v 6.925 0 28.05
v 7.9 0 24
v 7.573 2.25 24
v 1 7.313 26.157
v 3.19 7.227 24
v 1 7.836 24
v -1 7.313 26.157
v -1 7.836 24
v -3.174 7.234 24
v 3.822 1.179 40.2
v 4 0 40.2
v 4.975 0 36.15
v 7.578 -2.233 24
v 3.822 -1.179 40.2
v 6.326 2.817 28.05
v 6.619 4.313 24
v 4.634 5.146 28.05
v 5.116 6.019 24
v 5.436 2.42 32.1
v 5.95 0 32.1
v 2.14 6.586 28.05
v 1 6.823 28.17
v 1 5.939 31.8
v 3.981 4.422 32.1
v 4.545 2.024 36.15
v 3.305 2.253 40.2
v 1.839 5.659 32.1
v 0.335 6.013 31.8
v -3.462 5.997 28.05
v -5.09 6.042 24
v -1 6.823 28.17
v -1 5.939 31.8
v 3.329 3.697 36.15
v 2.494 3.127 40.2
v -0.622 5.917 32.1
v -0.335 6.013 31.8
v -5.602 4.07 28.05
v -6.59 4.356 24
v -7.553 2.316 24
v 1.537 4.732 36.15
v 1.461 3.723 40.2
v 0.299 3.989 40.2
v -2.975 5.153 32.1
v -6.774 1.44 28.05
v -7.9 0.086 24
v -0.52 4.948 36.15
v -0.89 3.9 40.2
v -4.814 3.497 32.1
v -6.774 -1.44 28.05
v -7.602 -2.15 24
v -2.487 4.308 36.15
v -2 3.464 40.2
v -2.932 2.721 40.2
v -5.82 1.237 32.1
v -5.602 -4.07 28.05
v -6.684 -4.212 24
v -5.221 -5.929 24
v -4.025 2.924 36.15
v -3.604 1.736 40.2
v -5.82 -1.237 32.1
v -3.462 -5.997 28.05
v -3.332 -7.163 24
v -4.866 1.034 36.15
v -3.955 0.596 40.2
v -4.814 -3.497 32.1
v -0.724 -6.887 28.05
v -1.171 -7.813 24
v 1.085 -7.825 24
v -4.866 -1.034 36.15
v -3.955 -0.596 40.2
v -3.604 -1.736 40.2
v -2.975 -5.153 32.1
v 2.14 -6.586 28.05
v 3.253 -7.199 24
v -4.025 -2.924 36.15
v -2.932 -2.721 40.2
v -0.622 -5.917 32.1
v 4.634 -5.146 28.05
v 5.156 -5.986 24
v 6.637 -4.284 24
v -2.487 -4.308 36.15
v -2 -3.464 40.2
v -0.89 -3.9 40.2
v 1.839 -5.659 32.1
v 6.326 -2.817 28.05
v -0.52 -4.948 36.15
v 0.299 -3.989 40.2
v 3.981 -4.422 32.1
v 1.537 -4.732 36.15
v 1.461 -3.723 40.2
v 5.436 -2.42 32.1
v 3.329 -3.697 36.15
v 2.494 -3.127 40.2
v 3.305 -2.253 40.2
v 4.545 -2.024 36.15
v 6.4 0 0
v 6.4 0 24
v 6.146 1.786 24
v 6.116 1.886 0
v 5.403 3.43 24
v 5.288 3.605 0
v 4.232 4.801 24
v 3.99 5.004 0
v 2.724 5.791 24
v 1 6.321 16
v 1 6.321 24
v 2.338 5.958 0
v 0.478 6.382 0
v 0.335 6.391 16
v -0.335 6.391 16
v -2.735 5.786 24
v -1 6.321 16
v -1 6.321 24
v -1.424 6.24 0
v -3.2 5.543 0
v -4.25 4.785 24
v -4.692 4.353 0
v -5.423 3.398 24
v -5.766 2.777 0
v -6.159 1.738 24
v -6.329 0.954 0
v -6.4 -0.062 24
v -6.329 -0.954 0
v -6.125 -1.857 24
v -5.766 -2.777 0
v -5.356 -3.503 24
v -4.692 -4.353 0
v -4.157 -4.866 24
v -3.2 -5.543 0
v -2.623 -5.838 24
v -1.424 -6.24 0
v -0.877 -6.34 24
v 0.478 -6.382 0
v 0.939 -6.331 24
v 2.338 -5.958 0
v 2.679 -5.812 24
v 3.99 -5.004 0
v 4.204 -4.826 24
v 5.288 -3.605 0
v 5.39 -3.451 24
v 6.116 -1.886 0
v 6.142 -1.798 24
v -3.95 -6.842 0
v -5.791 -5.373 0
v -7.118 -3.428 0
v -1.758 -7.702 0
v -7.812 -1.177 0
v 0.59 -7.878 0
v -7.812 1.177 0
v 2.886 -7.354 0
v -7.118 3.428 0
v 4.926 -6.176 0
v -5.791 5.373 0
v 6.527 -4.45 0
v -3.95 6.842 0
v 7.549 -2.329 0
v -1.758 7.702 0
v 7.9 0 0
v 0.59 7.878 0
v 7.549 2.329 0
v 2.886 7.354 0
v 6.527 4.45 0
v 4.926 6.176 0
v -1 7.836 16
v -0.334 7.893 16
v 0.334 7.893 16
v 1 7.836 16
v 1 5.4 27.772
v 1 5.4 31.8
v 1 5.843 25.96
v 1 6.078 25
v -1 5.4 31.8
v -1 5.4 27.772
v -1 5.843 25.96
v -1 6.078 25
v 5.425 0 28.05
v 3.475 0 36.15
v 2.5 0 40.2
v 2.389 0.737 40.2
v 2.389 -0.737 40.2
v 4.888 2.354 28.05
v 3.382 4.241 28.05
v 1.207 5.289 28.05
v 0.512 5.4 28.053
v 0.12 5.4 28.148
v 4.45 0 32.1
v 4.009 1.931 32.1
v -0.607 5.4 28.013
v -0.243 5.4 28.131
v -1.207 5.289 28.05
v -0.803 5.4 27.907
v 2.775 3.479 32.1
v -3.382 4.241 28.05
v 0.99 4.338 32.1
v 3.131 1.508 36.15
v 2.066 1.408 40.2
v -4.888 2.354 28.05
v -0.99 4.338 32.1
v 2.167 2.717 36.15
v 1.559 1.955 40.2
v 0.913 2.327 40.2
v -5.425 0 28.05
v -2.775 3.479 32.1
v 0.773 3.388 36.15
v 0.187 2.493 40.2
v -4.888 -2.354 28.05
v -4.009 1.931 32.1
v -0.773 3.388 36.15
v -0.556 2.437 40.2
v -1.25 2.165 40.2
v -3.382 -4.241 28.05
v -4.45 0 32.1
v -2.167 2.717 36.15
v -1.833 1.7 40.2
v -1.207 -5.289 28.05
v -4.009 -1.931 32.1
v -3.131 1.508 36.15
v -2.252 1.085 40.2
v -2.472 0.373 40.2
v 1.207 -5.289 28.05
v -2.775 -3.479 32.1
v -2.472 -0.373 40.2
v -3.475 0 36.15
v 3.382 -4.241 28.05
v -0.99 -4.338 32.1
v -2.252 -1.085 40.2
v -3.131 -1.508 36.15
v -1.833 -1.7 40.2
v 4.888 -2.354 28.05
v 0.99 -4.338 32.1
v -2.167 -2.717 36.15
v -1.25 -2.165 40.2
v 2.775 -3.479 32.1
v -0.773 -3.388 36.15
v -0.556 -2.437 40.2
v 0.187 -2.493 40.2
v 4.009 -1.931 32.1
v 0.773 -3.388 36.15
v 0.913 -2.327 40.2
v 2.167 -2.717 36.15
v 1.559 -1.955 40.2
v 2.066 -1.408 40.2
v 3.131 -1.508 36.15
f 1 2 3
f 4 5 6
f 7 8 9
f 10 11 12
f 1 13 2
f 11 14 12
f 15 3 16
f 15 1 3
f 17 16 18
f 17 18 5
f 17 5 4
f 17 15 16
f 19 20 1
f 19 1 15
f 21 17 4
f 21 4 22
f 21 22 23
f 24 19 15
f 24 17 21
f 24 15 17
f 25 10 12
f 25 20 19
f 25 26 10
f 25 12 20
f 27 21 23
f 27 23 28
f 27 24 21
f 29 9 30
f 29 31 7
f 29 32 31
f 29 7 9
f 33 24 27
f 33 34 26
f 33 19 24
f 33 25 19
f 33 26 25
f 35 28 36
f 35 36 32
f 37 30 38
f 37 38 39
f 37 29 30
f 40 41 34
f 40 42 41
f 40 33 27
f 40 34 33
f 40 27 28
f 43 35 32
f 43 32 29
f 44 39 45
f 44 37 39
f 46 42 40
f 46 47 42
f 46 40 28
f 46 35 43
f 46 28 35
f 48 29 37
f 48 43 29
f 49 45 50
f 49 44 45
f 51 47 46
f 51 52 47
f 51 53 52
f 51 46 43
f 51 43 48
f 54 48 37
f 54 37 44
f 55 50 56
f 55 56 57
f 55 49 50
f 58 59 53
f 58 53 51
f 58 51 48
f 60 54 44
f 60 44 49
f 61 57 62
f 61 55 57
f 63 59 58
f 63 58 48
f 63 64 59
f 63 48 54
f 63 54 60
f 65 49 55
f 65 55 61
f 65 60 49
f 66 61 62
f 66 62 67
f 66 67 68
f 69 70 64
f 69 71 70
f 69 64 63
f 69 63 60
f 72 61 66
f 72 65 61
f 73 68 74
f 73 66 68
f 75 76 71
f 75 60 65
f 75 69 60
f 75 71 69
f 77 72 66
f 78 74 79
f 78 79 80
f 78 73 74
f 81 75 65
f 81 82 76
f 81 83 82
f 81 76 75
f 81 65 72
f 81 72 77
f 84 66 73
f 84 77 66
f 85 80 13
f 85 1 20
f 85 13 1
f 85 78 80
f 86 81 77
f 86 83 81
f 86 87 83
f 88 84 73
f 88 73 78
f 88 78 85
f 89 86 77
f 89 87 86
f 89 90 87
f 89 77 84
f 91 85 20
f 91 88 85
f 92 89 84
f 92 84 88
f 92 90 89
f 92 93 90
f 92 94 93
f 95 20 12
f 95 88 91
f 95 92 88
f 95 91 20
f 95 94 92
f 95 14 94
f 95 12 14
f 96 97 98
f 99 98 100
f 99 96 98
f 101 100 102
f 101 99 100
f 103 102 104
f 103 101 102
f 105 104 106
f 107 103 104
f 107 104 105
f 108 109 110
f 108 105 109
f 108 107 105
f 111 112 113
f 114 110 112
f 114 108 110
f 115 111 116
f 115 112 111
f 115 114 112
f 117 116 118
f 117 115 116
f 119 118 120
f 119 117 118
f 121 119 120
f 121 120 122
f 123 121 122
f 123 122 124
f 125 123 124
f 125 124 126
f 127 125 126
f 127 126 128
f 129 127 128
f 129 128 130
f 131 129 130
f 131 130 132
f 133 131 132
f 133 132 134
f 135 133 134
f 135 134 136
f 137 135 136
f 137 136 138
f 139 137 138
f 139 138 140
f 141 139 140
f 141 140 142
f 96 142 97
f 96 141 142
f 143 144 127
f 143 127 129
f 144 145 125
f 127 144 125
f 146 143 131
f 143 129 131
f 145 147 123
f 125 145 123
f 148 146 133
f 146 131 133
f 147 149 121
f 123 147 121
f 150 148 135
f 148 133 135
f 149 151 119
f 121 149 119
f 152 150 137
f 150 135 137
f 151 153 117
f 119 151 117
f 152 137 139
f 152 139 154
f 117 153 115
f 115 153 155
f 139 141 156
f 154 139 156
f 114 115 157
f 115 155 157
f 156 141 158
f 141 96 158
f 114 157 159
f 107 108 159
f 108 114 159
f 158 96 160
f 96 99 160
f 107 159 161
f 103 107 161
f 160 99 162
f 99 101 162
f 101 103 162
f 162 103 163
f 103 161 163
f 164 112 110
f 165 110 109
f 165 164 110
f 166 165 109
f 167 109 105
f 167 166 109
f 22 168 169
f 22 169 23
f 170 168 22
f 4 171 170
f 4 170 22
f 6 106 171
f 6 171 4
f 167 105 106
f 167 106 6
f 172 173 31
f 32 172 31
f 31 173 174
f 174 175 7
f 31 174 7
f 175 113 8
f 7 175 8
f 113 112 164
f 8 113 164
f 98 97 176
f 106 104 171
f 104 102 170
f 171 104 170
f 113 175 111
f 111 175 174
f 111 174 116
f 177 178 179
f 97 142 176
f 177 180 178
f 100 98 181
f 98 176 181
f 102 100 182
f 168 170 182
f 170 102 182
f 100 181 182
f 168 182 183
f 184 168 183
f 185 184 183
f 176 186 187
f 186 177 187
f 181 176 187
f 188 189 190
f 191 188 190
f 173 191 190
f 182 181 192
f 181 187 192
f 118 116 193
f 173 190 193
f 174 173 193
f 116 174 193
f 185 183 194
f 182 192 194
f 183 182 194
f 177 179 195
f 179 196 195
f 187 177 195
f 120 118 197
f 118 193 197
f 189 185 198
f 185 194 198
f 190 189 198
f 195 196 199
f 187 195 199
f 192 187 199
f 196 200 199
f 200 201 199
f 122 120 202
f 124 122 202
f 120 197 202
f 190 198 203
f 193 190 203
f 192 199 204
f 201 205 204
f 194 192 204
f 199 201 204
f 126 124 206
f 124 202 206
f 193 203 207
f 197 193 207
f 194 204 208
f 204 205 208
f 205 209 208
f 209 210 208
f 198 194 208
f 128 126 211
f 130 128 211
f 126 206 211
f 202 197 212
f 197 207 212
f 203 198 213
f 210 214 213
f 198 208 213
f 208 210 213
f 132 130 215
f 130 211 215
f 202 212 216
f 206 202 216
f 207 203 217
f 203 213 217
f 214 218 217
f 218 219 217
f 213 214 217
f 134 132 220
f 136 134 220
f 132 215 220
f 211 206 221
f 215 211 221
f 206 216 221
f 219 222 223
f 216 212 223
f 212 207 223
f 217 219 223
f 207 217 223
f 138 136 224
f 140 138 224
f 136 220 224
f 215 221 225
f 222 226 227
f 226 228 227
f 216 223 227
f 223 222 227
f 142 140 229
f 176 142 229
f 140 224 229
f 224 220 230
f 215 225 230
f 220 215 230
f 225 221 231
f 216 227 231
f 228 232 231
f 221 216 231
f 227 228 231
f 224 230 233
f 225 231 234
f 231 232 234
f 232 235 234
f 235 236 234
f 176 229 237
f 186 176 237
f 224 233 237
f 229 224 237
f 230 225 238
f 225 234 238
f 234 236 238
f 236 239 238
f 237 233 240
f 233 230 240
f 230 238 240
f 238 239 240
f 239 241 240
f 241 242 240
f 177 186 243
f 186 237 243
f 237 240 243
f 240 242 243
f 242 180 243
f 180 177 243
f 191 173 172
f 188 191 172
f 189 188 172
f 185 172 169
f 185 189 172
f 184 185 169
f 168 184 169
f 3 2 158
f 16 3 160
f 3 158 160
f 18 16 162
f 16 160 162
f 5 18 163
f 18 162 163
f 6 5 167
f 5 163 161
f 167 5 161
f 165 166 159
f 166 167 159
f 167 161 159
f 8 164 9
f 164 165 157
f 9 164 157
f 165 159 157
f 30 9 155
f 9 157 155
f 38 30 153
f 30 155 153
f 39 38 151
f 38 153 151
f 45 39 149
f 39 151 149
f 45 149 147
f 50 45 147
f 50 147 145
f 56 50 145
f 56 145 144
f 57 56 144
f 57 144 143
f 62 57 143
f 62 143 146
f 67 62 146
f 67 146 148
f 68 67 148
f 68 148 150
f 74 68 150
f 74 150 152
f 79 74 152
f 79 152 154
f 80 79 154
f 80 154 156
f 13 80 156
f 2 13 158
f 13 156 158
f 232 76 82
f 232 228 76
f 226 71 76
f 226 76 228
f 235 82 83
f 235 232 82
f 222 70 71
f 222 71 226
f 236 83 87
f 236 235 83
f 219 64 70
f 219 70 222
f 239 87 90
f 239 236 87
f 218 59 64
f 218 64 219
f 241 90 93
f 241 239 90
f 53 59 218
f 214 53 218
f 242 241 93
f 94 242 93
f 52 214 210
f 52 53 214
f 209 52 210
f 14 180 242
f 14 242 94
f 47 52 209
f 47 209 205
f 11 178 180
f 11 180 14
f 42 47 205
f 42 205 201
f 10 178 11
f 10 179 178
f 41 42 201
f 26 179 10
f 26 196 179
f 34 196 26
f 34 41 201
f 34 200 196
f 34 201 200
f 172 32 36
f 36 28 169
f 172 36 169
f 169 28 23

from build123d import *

# Parameters (mm, degrees)
BOX002_W          = 2
BOX002_H          = 4.5
BOX002_DEPTH      = 15.8
CYLINDER001_R     = 6.4
CYLINDER001_DEPTH = 24
CYLINDER_R        = 7.9
CYLINDER_DEPTH    = 24


with BuildPart() as schlitz:
    # Box002 → Box002 (new body)
    with BuildSketch(Plane(origin=(-1, 5.4, 16), x_dir=(1, 0, 0), z_dir=(0, 0, 1))):
        with Locations((1, 2.25)):
            Rectangle(BOX002_W, BOX002_H)
    extrude(amount=BOX002_DEPTH)


with BuildPart() as kegel001:
    # Cone001 → Cone001 (revolve)
    with BuildSketch(Plane(origin=(0, 0, 24), x_dir=(1, 0, 0), z_dir=(0, -1, 0))):
        Polygon((0, 0), (6.4, 0), (2.5, 16.2), (0, 16.2), align=None)
    revolve(axis=Axis((0, 0, 24), (0, 0, 1)))


with BuildPart() as cut001:
    # Cone → Cone (revolve)
    with BuildSketch(Plane(origin=(0, 0, 24), x_dir=(1, 0, 0), z_dir=(0, -1, 0))):
        Polygon((0, 0), (7.9, 0), (4, 16.2), (0, 16.2), align=None)
    revolve(axis=Axis((0, 0, 24), (0, 0, 1)))

    # Cut001: cut Kegel001
    add(kegel001.part, mode=Mode.SUBTRACT)


with BuildPart() as loch_vorne:
    # Cylinder001 → Cylinder001 (new body)
    with BuildSketch(Plane.XY):
        Circle(CYLINDER001_R)
    extrude(amount=CYLINDER001_DEPTH)


with BuildPart() as geh_use_mit_schlitz:
    # Cylinder → Cylinder (new body)
    with BuildSketch(Plane.XY):
        Circle(CYLINDER_R)
    extrude(amount=CYLINDER_DEPTH)

    # Cut: cut Loch_vorne
    add(loch_vorne.part, mode=Mode.SUBTRACT)

    # Fusion001: union Cut001
    add(cut001.part)

    # Cut002: cut Schlitz
    add(schlitz.part, mode=Mode.SUBTRACT)


solid = geh_use_mit_schlitz.part
